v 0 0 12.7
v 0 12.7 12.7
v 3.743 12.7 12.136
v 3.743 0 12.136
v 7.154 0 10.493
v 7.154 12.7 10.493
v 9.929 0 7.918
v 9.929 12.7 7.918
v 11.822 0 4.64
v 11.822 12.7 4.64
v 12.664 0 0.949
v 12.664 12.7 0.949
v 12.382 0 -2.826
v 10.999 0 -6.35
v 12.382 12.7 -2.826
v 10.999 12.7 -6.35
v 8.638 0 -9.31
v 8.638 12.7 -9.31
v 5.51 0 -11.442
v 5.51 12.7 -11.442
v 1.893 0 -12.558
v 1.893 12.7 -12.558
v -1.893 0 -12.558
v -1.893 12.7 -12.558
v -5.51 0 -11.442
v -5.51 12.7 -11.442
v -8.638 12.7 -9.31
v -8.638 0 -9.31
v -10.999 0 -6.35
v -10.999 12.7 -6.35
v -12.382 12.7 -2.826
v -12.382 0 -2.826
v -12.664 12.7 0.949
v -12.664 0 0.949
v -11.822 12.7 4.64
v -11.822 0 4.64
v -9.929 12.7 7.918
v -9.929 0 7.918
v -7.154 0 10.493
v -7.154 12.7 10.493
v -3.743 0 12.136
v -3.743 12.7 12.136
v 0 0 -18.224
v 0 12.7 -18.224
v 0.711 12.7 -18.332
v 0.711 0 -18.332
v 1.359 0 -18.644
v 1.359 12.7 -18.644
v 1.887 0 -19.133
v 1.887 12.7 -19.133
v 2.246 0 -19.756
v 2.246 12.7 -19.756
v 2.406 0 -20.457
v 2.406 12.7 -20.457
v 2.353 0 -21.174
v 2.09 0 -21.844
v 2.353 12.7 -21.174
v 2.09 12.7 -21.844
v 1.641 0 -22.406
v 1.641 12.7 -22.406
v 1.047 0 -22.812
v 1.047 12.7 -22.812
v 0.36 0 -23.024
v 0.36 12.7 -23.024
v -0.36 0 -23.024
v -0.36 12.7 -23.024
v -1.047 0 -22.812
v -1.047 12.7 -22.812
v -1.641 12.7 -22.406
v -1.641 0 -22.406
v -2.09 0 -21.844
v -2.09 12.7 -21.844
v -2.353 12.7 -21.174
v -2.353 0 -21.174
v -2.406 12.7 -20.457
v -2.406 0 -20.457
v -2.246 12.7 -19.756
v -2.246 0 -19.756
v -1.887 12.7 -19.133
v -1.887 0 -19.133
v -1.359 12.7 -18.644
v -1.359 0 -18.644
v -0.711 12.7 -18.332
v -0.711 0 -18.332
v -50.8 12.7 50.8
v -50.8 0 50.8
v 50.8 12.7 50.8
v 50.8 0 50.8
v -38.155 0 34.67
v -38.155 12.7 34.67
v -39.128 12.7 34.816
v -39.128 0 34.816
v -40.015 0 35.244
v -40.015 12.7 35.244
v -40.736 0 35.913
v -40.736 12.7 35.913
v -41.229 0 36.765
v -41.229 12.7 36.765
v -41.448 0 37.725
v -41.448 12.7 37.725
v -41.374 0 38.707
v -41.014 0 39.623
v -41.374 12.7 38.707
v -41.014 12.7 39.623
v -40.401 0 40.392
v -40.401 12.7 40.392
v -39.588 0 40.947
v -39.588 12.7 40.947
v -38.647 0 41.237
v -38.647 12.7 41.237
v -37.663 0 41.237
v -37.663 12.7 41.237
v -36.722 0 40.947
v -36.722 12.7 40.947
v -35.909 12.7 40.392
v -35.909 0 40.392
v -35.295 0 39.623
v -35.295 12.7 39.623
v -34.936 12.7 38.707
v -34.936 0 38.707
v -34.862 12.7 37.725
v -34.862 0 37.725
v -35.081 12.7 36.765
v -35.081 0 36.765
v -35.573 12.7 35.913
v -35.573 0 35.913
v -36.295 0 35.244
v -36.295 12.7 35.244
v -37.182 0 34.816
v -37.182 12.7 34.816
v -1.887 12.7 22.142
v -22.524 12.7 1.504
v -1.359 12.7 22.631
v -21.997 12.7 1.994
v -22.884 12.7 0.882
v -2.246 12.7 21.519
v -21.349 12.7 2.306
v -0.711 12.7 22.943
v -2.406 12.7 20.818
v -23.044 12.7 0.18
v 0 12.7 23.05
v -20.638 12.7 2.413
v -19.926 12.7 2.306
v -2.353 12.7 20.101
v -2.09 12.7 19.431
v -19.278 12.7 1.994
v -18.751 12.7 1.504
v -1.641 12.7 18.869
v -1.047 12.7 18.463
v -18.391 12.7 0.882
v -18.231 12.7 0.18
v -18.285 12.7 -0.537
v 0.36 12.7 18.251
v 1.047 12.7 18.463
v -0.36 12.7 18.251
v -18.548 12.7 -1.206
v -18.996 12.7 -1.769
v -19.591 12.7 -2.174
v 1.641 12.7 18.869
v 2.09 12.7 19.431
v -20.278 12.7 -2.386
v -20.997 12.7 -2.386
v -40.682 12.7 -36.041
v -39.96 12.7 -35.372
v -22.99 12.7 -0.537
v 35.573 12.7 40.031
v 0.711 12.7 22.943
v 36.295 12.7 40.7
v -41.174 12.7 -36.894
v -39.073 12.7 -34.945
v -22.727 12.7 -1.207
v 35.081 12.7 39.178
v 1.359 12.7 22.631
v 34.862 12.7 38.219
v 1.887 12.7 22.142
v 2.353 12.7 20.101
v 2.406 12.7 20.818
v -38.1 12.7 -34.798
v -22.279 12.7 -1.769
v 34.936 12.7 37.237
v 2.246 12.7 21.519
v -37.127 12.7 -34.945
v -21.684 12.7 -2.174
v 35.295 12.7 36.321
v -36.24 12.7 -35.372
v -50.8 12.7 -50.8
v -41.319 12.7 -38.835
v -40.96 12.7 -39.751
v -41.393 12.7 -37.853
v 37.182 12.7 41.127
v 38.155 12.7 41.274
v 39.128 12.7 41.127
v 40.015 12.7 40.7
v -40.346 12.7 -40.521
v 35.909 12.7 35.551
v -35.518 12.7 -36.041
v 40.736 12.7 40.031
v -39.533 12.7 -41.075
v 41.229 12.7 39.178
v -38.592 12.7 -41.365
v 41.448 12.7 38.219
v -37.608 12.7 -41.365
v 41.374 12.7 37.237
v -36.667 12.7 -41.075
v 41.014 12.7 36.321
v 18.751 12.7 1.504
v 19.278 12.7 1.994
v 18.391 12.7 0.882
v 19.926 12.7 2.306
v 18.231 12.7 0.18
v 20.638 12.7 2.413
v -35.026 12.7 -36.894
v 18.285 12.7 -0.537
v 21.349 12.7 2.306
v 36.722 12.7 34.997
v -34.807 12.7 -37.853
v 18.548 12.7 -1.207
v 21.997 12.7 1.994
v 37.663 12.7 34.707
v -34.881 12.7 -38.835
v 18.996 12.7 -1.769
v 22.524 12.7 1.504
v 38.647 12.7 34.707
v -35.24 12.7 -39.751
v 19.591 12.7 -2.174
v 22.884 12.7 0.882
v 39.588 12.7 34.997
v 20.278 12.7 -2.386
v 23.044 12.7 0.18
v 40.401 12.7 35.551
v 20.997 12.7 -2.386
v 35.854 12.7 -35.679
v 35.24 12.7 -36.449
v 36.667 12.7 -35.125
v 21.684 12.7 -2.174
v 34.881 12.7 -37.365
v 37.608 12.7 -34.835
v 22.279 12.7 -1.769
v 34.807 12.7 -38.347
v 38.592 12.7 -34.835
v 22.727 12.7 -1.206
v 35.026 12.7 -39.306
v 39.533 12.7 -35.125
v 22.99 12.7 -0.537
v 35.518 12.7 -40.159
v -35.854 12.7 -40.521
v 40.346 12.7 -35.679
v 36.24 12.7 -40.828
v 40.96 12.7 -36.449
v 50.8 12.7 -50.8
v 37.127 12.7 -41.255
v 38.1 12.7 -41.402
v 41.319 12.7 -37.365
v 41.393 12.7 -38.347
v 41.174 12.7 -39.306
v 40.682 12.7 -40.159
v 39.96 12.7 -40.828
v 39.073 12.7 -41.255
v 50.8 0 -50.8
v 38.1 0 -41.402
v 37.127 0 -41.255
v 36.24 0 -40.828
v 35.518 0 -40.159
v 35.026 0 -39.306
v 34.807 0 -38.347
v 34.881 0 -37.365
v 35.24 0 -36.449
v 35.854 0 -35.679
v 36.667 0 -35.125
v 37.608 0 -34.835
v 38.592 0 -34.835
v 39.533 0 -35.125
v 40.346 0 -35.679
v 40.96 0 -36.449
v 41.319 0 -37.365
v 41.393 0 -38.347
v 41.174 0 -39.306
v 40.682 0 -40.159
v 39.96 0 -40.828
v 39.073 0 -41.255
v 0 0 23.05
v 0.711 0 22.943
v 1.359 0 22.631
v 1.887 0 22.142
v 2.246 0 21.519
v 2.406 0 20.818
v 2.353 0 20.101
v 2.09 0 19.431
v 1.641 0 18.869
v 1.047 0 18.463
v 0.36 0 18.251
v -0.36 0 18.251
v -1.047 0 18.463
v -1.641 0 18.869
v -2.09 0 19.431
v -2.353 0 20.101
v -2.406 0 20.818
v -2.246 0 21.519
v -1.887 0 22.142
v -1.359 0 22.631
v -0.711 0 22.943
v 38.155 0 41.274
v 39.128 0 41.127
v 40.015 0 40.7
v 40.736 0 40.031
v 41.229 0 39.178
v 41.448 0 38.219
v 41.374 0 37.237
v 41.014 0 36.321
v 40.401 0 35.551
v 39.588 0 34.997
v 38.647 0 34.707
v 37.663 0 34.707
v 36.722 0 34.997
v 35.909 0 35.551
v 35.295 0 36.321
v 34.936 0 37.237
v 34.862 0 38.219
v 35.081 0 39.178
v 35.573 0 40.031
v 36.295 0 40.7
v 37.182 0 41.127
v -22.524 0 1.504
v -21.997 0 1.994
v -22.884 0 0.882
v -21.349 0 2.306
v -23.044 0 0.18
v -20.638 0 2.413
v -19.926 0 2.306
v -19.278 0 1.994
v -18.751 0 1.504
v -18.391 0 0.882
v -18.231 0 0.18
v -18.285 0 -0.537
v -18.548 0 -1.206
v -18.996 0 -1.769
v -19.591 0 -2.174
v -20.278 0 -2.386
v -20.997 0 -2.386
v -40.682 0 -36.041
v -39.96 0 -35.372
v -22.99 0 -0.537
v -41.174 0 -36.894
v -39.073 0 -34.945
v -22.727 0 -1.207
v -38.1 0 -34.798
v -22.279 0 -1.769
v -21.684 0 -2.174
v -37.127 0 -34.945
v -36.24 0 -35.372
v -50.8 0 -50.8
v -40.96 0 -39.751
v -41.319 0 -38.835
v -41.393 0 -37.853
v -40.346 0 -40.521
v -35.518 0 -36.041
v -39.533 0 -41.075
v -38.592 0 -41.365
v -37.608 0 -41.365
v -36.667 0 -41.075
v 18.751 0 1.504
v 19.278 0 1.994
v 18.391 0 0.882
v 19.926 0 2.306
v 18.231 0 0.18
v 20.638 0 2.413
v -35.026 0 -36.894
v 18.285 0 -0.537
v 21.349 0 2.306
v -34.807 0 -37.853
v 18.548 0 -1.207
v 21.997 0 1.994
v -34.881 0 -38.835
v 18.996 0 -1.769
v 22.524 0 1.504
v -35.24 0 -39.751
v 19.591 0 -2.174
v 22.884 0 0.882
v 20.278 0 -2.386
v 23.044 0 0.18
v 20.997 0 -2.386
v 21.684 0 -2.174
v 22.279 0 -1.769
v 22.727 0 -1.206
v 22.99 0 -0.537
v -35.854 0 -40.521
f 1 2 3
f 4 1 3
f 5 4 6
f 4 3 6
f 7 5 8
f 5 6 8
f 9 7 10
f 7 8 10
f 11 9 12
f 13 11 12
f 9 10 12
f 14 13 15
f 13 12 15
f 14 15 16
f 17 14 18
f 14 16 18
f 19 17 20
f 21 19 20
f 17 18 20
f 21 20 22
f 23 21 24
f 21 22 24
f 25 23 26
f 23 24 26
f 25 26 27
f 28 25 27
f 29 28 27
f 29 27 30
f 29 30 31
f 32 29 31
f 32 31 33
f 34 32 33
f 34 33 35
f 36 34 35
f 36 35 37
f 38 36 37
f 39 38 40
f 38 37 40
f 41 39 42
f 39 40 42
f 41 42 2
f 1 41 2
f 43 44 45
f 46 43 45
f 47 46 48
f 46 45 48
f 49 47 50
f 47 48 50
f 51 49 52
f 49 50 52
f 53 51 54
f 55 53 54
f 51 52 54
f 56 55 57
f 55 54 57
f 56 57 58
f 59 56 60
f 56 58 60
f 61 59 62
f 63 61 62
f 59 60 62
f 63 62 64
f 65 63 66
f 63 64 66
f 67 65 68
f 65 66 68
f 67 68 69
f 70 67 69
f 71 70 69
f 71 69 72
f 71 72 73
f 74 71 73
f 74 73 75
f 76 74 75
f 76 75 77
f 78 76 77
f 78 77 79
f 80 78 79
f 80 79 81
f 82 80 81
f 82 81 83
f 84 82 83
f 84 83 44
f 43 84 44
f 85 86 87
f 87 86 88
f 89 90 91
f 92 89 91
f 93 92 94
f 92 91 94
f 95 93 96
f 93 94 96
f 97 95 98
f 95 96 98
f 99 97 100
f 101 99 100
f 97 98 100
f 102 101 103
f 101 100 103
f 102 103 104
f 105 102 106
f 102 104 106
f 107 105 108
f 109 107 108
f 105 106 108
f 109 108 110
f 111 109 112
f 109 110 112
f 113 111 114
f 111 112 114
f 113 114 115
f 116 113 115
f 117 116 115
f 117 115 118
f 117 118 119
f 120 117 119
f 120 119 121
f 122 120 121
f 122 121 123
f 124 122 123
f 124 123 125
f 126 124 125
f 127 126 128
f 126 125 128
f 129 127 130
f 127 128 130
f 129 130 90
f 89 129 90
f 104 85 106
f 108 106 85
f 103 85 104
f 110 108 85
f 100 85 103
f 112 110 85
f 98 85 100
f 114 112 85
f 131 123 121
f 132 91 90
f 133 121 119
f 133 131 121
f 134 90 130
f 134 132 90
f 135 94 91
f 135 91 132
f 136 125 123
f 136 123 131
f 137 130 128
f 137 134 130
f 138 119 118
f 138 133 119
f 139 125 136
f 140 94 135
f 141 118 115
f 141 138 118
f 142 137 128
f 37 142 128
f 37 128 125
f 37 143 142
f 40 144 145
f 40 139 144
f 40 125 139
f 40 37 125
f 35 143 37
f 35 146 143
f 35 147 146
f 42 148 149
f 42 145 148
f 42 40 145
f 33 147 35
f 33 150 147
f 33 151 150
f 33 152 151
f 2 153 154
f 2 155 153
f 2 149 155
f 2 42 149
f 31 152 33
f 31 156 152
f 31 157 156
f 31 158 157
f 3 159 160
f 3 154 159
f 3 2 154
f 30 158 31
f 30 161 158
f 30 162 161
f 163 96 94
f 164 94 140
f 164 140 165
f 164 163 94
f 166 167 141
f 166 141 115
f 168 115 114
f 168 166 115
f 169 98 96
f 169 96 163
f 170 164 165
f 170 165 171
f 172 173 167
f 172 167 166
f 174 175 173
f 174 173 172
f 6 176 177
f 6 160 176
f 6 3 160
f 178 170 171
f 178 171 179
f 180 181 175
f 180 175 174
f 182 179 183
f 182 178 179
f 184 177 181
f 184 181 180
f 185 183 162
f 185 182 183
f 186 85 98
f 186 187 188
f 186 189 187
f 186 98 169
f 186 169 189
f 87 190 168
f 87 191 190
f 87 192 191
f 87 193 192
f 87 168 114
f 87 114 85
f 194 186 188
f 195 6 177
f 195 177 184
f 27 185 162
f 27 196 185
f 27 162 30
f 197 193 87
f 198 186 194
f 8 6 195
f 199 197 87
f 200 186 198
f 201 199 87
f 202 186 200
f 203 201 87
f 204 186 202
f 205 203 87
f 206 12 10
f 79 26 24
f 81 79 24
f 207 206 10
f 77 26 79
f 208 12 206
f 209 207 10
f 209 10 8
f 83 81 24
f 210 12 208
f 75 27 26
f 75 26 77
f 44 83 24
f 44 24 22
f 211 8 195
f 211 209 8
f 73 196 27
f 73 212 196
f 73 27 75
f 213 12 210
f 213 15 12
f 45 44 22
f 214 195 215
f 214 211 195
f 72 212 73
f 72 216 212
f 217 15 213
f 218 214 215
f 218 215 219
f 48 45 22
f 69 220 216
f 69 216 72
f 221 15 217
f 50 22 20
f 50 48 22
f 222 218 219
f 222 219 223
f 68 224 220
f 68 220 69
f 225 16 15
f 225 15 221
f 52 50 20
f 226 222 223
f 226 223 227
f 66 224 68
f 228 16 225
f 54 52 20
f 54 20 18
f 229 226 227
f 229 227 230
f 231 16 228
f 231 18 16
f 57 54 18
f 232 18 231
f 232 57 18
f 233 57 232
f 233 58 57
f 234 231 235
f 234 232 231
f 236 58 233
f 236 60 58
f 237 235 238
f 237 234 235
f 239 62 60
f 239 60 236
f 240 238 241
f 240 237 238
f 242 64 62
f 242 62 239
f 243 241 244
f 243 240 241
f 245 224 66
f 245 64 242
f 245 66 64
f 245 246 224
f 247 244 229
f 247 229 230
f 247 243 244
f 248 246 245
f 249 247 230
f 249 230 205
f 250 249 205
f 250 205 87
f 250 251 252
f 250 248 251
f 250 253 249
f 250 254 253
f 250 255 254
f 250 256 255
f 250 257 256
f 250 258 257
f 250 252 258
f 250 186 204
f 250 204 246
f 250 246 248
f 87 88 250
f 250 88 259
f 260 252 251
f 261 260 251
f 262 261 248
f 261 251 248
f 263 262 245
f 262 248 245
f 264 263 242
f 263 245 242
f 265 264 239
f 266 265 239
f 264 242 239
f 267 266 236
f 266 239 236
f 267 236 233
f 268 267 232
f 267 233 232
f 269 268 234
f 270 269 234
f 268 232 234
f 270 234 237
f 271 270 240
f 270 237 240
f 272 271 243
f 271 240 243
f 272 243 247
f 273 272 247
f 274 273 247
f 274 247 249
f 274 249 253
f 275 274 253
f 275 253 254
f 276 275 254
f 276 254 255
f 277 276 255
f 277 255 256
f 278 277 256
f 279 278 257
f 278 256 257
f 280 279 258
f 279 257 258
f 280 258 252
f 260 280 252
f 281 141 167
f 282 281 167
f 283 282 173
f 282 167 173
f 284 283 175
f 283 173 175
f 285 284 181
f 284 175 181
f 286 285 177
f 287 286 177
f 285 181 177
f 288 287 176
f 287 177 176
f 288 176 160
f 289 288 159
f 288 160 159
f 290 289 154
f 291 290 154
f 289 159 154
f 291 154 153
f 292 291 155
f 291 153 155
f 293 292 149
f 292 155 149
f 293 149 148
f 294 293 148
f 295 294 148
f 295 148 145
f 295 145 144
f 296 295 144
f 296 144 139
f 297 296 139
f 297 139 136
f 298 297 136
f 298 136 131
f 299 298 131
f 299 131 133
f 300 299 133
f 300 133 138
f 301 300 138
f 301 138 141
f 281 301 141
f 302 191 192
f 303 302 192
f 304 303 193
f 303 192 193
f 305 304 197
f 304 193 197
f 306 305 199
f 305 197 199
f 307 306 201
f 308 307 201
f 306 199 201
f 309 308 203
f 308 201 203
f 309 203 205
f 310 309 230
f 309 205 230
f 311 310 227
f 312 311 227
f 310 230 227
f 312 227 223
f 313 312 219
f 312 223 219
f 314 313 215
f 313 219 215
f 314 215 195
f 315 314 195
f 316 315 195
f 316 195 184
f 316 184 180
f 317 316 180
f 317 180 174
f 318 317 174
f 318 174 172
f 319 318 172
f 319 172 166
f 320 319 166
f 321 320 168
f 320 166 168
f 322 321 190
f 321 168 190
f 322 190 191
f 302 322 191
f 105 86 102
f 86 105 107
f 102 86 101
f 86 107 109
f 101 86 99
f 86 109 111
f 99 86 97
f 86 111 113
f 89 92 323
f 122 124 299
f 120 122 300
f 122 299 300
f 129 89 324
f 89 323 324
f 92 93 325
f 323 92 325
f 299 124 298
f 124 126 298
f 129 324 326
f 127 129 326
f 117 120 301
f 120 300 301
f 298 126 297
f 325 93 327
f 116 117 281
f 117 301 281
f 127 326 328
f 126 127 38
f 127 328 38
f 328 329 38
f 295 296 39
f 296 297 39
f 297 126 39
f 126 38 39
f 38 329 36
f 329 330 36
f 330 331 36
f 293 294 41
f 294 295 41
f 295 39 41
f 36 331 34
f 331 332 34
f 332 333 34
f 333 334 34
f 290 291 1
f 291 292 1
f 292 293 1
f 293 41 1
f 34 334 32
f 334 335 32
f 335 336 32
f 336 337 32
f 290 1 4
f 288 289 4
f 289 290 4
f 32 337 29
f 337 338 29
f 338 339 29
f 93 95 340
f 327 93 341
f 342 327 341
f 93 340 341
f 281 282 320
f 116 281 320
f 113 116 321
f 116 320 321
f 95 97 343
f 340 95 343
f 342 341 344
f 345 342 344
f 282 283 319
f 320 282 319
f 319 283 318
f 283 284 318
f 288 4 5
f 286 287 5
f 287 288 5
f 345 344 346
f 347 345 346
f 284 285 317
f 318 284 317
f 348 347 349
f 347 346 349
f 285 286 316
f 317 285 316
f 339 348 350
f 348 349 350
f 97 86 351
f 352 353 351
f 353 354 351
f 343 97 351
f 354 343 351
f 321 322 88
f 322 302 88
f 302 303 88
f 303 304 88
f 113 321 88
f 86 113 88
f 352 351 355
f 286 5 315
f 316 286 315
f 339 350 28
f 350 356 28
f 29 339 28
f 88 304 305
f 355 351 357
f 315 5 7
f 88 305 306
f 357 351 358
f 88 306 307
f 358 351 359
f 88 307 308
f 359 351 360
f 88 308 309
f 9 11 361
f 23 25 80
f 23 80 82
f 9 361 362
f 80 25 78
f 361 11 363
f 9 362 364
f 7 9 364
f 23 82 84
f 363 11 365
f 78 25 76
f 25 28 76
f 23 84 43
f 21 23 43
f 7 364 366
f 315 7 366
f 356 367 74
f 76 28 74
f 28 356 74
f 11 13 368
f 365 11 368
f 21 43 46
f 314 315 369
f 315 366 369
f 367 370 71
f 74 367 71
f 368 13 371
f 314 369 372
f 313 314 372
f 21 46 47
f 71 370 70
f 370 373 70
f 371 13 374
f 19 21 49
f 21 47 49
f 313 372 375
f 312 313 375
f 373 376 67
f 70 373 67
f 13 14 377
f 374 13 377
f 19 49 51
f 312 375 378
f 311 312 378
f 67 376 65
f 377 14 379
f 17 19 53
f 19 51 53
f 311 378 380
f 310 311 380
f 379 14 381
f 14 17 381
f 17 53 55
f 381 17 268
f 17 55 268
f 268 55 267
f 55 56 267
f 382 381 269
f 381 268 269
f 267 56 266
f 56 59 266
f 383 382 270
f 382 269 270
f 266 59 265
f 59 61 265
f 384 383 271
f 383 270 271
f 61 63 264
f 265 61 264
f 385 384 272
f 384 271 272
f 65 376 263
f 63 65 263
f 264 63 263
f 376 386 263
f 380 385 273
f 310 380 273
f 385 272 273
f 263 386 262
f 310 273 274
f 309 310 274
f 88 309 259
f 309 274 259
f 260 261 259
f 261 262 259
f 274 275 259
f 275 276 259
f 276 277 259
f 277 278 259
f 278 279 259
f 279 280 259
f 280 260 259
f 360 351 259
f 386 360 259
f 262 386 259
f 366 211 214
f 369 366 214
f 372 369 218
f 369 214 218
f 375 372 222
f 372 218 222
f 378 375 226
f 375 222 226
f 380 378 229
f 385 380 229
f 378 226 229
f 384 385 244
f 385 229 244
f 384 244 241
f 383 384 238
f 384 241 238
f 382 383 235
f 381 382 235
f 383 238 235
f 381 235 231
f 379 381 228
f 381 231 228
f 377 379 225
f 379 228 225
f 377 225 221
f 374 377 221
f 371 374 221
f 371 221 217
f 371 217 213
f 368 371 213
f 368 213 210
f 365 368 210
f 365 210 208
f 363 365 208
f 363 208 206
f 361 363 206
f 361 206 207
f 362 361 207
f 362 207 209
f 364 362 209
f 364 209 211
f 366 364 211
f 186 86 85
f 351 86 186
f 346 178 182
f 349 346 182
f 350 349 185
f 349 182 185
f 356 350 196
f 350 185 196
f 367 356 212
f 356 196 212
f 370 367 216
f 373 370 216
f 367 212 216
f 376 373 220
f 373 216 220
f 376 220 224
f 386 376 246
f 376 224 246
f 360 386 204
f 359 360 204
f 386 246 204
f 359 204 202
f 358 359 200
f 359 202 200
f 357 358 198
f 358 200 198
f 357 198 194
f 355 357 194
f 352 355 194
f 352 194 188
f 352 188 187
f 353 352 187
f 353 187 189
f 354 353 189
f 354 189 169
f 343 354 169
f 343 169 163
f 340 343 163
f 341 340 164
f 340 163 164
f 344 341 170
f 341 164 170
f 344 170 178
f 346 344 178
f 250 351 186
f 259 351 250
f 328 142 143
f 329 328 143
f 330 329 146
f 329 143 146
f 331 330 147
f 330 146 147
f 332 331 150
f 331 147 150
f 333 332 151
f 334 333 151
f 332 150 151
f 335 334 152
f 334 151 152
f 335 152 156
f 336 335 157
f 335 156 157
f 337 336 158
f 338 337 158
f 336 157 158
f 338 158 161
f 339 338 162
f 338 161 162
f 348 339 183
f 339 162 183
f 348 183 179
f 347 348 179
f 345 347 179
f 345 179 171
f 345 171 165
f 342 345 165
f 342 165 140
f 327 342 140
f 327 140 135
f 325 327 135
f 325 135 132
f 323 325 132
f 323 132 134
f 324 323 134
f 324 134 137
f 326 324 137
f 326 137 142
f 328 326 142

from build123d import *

# Parameters (mm, degrees)
SKETCH2_W           = 101.6
SKETCH2_H           = 101.6
BOSS_EXTRUDE1_DEPTH = 12.7
SKETCH3_R           = 3.302
CUT_EXTRUDE1_DEPTH  = 12.7
SKETCH4_R           = 12.7
CUT_EXTRUDE2_DEPTH  = 12.7
SKETCH5_R           = 2.413
CUT_EXTRUDE3_DEPTH  = 63.5


with BuildPart() as part:
    # Sketch2 → Boss-Extrude1 (new body)
    with BuildSketch(Plane(origin=(0, 0, 0), x_dir=(1, 0, 0), z_dir=(0, 1, 0))):
        Rectangle(SKETCH2_W, SKETCH2_H)
    extrude(amount=BOSS_EXTRUDE1_DEPTH)

    # Sketch3 → Cut-Extrude1 (cut)
    with BuildSketch(Plane(origin=(0, 12.7, 0), x_dir=(1, 0, 0), z_dir=(0, 1, 0))):
        with Locations(Location((-38.1, 38.1, 0), (0, 0, 270))):
            Circle(SKETCH3_R)
        with Locations(Location((-38.15484628, -37.971770083, 0), (0, 0, 90))):
            Circle(SKETCH3_R)
        with Locations(Location((38.15484628, -37.971770083, 0), (0, 0, 270))):
            Circle(SKETCH3_R)
        with Locations(Location((38.1, 38.1, 0), (0, 0, 90))):
            Circle(SKETCH3_R)
    extrude(amount=-CUT_EXTRUDE1_DEPTH, mode=Mode.SUBTRACT)

    # Sketch4 → Cut-Extrude2 (cut)
    with BuildSketch(Plane(origin=(0, 12.7, 0), x_dir=(1, 0, 0), z_dir=(0, 1, 0))):
        with Locations(Location((0, 0, 0), (0, 0, 270))):
            Circle(SKETCH4_R)
    extrude(amount=-CUT_EXTRUDE2_DEPTH, mode=Mode.SUBTRACT)

    # Sketch5 → Cut-Extrude3 (cut)
    with BuildSketch(Plane(origin=(0, 12.7, 0), x_dir=(1, 0, 0), z_dir=(0, 1, 0))):
        with Locations(Location((0, 20.6375, 0), (0, 0, 270))):
            Circle(SKETCH5_R)
        with Locations(Location((20.6375, 0, 0), (0, 0, 270))):
            Circle(SKETCH5_R)
        with Locations(Location((0, -20.6375, 0), (0, 0, 270))):
            Circle(SKETCH5_R)
        with Locations(Location((-20.6375, 0, 0), (0, 0, 270))):
            Circle(SKETCH5_R)
    extrude(amount=-CUT_EXTRUDE3_DEPTH, mode=Mode.SUBTRACT)


solid = part.part
